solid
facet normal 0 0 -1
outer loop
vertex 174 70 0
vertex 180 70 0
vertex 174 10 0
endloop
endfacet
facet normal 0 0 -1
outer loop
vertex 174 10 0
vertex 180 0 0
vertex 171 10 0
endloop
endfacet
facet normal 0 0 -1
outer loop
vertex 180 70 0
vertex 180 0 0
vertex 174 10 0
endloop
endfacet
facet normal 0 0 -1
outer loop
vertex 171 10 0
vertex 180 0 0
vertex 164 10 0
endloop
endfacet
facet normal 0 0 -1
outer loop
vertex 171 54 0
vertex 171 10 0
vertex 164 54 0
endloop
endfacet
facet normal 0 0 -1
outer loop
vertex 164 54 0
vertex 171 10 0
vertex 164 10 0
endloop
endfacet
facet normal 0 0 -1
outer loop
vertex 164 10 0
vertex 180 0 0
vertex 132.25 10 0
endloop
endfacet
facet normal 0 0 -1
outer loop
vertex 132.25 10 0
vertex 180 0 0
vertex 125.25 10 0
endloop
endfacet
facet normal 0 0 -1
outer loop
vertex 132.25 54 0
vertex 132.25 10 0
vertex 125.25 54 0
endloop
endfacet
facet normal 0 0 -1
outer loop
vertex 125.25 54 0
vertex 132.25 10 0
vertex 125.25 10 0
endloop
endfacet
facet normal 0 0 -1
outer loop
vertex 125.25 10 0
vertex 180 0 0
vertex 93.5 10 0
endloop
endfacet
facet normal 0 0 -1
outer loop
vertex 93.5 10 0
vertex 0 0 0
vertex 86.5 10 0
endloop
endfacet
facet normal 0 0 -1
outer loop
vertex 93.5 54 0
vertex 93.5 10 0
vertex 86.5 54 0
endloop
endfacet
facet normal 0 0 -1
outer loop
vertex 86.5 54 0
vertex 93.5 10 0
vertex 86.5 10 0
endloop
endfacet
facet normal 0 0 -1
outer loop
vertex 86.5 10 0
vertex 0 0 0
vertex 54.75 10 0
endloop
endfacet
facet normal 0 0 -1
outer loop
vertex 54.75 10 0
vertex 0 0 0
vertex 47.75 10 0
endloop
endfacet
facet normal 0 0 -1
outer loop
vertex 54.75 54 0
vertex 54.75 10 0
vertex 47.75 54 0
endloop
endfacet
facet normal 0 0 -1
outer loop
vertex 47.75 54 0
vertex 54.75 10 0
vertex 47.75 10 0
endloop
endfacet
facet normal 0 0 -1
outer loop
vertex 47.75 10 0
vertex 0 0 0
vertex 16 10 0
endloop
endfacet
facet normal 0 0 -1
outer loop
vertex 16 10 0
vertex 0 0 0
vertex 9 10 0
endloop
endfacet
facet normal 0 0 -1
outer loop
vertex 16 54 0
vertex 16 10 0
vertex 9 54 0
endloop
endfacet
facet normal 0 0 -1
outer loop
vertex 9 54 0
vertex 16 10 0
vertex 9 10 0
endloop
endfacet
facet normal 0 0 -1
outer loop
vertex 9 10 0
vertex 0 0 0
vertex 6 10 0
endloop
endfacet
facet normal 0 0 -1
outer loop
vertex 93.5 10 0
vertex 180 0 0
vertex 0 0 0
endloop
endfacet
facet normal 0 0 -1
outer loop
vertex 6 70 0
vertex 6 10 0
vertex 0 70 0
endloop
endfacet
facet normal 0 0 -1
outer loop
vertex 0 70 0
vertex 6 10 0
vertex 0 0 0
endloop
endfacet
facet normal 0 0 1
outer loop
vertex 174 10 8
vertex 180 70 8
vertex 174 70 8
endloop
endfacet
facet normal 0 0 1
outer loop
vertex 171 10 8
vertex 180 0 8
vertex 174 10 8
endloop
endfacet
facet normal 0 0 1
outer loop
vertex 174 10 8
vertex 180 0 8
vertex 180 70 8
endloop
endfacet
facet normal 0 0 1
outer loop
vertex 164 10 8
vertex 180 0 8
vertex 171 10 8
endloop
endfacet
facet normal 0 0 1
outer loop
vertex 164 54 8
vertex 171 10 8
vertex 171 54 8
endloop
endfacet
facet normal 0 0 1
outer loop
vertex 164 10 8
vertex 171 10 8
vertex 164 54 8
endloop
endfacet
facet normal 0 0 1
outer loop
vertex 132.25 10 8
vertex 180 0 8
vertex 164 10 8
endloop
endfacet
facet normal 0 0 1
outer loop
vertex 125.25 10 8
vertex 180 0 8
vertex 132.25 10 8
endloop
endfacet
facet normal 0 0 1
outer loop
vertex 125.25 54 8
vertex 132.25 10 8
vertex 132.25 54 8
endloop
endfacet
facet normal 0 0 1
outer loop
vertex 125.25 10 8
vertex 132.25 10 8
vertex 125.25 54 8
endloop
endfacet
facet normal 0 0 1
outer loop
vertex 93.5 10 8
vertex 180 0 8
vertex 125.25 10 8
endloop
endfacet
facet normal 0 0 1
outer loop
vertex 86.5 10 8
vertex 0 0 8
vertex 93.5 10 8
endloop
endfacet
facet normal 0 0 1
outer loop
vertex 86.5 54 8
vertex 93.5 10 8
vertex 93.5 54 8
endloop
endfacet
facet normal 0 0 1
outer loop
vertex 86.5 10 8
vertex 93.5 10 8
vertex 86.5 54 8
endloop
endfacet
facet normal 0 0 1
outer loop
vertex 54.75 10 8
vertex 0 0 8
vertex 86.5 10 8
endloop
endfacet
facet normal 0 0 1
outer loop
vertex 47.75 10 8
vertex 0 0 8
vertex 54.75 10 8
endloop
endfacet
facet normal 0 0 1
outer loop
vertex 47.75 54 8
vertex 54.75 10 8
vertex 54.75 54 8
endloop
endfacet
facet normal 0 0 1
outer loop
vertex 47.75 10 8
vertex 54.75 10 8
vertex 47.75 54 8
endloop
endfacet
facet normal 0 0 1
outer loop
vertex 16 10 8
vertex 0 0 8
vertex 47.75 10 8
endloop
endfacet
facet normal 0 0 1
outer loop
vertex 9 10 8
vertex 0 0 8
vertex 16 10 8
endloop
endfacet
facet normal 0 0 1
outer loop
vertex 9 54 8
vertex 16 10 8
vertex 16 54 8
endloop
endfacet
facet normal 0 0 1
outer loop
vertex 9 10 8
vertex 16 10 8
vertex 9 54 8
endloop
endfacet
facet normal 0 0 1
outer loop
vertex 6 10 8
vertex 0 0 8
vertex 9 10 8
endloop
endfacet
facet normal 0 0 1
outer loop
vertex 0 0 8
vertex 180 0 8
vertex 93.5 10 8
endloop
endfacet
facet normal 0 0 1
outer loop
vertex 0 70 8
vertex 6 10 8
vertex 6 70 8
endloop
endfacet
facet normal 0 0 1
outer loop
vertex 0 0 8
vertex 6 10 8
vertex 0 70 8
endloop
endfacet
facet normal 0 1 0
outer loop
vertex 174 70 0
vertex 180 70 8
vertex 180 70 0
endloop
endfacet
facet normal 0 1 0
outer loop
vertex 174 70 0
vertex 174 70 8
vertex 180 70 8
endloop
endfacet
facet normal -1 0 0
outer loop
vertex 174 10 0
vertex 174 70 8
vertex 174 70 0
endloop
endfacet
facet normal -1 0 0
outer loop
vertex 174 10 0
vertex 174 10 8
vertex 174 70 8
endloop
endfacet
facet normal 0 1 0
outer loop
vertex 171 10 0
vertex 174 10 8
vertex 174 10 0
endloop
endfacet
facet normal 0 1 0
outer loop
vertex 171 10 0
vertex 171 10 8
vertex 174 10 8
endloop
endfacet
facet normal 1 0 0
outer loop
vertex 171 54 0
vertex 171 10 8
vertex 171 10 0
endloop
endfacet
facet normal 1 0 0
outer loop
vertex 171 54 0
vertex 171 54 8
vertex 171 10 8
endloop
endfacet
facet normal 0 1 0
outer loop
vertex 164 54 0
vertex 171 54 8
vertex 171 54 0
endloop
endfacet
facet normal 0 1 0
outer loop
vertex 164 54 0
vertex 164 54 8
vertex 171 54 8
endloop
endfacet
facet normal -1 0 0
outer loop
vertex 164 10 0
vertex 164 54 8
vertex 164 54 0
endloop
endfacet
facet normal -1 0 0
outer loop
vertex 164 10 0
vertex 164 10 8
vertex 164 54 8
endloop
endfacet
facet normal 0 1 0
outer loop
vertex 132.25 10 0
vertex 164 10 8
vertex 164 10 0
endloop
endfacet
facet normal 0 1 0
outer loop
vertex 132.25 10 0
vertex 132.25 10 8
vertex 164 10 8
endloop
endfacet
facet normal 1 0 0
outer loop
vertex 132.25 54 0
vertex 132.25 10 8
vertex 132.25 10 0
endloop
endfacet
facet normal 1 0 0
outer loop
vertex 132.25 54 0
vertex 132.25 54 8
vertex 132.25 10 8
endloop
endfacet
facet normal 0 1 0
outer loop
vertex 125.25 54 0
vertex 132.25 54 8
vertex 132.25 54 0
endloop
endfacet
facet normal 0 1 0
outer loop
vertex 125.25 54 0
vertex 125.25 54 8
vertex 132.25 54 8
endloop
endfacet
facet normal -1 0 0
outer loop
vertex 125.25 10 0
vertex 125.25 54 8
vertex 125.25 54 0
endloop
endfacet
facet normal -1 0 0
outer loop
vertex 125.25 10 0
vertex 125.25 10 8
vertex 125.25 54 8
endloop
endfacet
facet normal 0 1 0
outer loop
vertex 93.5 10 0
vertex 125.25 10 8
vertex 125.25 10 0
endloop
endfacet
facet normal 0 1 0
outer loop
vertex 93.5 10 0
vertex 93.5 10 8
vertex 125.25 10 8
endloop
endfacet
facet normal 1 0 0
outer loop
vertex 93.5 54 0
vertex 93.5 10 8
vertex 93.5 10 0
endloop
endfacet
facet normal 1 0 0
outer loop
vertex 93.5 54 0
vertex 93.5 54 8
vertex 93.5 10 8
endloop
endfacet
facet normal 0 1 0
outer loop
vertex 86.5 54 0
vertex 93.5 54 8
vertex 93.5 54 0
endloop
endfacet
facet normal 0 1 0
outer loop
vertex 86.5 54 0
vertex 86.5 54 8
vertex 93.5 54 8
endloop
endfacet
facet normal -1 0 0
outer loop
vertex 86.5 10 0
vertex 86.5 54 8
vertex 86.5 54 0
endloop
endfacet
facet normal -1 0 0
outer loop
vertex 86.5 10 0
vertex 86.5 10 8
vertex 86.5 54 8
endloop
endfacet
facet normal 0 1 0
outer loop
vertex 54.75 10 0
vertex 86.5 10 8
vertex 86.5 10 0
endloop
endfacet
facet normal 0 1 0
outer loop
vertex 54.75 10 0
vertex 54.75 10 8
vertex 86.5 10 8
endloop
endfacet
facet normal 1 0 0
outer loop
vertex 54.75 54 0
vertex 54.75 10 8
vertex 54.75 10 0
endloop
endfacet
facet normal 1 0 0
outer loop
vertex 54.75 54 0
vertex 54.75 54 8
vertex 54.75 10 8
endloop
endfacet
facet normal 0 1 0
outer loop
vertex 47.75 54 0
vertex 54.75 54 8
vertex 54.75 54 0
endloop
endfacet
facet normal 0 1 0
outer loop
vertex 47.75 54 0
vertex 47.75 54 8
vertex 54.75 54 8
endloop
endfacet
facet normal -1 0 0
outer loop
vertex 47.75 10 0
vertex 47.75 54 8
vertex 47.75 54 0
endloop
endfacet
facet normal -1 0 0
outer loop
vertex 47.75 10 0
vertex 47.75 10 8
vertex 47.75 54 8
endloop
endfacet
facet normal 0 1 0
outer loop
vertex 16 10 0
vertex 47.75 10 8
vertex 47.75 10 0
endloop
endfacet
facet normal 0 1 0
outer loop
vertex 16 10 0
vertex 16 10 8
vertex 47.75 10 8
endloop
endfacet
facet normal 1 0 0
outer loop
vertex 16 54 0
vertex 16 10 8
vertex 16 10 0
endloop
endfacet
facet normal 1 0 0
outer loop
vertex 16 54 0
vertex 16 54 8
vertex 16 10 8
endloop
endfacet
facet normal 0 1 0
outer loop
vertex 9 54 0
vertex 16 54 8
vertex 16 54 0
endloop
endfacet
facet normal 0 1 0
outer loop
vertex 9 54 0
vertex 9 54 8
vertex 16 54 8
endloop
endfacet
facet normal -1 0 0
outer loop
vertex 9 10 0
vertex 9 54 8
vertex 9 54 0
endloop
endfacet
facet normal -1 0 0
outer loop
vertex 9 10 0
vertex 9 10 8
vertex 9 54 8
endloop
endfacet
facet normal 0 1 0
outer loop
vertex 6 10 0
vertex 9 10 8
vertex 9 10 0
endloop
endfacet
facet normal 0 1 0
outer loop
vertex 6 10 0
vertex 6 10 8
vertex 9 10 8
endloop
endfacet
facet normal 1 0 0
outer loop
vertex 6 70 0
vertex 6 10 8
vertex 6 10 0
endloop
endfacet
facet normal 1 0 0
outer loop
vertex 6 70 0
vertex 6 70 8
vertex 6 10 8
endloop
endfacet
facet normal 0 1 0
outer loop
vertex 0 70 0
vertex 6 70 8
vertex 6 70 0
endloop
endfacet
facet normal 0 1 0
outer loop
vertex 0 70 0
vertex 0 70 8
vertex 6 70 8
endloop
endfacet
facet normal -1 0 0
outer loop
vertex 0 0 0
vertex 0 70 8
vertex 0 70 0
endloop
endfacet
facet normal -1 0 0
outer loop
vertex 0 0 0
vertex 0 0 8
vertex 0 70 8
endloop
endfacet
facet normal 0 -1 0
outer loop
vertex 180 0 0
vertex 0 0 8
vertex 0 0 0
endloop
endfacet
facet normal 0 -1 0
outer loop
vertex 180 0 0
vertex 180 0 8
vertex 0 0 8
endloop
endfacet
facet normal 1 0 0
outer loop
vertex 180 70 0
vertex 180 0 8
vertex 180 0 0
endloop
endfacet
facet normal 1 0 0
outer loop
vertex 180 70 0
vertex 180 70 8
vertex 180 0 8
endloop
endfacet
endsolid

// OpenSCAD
$fn = 32;

// ----------------------------------------------------------------------
// Guard grille: 5 slats over a 180 x 70 mm plate
// ----------------------------------------------------------------------

// --- parameters (mm) ---
profile_height = 8;       // extrusion height
profile_points = 28;      // points of the closed outline

profile = [[0, 0], [180, 0], [180, 70], [174, 70], [174, 10], [171, 10], [171, 54], [164, 54], [164, 10], [132.25, 10], [132.25, 54], [125.25, 54], [125.25, 10], [93.5, 10], [93.5, 54], [86.5, 54], [86.5, 10], [54.75, 10], [54.75, 54], [47.75, 54], [47.75, 10], [16, 10], [16, 54], [9, 54], [9, 10], [6, 10], [6, 70], [0, 70]];  // single closed polygon, 28 points, counter clockwise

// --- the one profile operation ---
linear_extrude(height = profile_height) polygon(points = profile);
